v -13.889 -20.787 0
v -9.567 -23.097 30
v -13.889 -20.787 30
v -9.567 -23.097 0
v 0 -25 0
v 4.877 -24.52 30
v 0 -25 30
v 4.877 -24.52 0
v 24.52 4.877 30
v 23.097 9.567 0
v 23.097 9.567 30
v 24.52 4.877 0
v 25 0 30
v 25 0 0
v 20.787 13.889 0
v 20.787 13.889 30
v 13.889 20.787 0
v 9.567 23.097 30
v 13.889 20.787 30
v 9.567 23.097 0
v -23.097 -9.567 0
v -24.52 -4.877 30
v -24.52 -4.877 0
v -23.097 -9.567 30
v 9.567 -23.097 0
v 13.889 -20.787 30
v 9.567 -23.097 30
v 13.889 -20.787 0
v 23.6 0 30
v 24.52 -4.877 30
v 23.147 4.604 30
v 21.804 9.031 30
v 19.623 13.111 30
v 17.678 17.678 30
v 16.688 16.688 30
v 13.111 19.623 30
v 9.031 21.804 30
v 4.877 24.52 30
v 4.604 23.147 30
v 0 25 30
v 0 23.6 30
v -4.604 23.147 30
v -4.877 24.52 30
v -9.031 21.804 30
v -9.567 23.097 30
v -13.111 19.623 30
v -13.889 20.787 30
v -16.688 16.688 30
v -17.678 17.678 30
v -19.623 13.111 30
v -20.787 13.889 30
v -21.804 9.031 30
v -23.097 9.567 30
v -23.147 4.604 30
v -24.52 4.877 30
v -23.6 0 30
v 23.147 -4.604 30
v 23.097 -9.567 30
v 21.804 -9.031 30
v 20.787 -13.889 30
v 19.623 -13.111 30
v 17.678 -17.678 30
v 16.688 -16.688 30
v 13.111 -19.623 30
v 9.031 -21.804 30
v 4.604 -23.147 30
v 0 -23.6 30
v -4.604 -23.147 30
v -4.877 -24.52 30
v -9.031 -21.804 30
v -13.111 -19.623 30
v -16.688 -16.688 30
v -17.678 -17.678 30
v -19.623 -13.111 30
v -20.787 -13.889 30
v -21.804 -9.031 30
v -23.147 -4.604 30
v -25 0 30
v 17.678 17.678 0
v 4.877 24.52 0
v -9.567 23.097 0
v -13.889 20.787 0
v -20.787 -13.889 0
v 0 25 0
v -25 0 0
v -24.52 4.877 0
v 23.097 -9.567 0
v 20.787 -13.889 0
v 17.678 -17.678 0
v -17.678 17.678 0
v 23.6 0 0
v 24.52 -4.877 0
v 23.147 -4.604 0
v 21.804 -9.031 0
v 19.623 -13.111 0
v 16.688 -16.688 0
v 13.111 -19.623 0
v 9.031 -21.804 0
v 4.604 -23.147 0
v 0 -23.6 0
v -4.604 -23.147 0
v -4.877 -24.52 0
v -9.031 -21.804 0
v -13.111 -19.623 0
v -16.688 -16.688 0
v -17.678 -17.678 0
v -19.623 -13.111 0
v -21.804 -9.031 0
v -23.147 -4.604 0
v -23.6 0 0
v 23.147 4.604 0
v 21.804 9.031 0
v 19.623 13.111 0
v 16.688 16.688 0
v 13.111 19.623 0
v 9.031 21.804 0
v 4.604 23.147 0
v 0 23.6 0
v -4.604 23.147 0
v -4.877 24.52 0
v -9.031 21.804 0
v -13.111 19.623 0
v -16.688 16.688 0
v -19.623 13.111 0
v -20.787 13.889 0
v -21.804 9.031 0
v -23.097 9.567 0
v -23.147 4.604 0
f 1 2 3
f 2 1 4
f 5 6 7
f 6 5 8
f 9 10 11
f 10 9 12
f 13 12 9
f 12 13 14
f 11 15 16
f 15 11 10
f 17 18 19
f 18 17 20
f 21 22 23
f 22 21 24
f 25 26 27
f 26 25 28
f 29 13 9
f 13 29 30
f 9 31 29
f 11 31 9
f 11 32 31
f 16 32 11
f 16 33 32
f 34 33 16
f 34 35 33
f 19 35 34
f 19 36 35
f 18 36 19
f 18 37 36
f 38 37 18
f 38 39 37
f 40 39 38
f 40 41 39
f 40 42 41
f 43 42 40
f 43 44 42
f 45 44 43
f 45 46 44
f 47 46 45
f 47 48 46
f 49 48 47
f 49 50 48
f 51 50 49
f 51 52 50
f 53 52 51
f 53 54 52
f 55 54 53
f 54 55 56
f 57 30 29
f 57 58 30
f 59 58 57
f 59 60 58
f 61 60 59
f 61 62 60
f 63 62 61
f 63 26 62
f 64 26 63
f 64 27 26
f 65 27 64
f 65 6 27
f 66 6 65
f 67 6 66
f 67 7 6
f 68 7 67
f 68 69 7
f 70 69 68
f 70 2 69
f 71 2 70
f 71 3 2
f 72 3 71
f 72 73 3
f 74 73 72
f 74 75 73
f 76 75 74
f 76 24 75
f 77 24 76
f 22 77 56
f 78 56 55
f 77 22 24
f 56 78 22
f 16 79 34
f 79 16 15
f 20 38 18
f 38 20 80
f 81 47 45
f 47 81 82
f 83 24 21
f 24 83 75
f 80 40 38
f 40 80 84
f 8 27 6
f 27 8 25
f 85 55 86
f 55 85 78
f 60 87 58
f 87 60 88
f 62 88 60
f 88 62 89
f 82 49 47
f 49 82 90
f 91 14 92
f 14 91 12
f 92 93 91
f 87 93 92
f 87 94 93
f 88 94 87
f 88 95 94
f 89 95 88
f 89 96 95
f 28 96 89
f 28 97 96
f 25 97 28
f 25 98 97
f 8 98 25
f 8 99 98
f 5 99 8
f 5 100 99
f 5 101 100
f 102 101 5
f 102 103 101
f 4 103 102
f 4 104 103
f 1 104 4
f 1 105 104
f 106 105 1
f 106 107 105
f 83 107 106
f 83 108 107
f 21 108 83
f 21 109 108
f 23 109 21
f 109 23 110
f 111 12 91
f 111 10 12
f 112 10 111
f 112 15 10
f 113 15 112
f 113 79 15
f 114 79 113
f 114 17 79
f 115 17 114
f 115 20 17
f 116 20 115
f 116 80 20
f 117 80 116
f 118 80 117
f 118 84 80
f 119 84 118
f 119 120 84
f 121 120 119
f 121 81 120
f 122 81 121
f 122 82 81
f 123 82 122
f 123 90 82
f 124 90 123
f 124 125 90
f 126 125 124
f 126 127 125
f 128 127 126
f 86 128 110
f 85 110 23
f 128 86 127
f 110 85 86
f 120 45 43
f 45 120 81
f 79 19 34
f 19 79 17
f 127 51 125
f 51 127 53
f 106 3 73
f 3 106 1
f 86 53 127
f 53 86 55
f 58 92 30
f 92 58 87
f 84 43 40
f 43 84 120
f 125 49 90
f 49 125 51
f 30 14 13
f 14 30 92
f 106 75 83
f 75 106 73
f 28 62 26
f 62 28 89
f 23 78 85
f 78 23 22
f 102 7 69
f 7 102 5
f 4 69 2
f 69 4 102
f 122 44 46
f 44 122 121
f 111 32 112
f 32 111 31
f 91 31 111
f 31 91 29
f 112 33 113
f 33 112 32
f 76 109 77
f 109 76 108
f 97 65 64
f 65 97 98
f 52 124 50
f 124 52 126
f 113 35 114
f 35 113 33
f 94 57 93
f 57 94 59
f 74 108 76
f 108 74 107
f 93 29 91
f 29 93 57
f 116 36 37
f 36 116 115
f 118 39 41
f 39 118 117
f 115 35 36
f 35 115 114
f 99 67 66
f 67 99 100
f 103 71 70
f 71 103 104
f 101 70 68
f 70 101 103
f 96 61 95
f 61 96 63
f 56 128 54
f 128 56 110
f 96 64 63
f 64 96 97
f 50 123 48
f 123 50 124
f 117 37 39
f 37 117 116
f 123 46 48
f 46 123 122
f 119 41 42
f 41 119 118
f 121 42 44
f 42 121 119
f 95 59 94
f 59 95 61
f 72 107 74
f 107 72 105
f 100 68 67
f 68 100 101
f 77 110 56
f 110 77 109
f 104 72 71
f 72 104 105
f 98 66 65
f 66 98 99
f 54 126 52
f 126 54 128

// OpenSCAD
$fn = 32;

// ----------------------------------------------------------------------
// Thin tube: 1.4 mm wall
// ----------------------------------------------------------------------

// --- parameters (mm) ---
tube_od = 50;             // outer diameter
tube_h = 30;              // height, Z
wall = 1.4;               // wall thickness

difference() {
  cylinder(h = tube_h, d = tube_od);
  translate([0, 0, -1]) cylinder(h = tube_h + 2, d = tube_od - 2 * wall);
}
